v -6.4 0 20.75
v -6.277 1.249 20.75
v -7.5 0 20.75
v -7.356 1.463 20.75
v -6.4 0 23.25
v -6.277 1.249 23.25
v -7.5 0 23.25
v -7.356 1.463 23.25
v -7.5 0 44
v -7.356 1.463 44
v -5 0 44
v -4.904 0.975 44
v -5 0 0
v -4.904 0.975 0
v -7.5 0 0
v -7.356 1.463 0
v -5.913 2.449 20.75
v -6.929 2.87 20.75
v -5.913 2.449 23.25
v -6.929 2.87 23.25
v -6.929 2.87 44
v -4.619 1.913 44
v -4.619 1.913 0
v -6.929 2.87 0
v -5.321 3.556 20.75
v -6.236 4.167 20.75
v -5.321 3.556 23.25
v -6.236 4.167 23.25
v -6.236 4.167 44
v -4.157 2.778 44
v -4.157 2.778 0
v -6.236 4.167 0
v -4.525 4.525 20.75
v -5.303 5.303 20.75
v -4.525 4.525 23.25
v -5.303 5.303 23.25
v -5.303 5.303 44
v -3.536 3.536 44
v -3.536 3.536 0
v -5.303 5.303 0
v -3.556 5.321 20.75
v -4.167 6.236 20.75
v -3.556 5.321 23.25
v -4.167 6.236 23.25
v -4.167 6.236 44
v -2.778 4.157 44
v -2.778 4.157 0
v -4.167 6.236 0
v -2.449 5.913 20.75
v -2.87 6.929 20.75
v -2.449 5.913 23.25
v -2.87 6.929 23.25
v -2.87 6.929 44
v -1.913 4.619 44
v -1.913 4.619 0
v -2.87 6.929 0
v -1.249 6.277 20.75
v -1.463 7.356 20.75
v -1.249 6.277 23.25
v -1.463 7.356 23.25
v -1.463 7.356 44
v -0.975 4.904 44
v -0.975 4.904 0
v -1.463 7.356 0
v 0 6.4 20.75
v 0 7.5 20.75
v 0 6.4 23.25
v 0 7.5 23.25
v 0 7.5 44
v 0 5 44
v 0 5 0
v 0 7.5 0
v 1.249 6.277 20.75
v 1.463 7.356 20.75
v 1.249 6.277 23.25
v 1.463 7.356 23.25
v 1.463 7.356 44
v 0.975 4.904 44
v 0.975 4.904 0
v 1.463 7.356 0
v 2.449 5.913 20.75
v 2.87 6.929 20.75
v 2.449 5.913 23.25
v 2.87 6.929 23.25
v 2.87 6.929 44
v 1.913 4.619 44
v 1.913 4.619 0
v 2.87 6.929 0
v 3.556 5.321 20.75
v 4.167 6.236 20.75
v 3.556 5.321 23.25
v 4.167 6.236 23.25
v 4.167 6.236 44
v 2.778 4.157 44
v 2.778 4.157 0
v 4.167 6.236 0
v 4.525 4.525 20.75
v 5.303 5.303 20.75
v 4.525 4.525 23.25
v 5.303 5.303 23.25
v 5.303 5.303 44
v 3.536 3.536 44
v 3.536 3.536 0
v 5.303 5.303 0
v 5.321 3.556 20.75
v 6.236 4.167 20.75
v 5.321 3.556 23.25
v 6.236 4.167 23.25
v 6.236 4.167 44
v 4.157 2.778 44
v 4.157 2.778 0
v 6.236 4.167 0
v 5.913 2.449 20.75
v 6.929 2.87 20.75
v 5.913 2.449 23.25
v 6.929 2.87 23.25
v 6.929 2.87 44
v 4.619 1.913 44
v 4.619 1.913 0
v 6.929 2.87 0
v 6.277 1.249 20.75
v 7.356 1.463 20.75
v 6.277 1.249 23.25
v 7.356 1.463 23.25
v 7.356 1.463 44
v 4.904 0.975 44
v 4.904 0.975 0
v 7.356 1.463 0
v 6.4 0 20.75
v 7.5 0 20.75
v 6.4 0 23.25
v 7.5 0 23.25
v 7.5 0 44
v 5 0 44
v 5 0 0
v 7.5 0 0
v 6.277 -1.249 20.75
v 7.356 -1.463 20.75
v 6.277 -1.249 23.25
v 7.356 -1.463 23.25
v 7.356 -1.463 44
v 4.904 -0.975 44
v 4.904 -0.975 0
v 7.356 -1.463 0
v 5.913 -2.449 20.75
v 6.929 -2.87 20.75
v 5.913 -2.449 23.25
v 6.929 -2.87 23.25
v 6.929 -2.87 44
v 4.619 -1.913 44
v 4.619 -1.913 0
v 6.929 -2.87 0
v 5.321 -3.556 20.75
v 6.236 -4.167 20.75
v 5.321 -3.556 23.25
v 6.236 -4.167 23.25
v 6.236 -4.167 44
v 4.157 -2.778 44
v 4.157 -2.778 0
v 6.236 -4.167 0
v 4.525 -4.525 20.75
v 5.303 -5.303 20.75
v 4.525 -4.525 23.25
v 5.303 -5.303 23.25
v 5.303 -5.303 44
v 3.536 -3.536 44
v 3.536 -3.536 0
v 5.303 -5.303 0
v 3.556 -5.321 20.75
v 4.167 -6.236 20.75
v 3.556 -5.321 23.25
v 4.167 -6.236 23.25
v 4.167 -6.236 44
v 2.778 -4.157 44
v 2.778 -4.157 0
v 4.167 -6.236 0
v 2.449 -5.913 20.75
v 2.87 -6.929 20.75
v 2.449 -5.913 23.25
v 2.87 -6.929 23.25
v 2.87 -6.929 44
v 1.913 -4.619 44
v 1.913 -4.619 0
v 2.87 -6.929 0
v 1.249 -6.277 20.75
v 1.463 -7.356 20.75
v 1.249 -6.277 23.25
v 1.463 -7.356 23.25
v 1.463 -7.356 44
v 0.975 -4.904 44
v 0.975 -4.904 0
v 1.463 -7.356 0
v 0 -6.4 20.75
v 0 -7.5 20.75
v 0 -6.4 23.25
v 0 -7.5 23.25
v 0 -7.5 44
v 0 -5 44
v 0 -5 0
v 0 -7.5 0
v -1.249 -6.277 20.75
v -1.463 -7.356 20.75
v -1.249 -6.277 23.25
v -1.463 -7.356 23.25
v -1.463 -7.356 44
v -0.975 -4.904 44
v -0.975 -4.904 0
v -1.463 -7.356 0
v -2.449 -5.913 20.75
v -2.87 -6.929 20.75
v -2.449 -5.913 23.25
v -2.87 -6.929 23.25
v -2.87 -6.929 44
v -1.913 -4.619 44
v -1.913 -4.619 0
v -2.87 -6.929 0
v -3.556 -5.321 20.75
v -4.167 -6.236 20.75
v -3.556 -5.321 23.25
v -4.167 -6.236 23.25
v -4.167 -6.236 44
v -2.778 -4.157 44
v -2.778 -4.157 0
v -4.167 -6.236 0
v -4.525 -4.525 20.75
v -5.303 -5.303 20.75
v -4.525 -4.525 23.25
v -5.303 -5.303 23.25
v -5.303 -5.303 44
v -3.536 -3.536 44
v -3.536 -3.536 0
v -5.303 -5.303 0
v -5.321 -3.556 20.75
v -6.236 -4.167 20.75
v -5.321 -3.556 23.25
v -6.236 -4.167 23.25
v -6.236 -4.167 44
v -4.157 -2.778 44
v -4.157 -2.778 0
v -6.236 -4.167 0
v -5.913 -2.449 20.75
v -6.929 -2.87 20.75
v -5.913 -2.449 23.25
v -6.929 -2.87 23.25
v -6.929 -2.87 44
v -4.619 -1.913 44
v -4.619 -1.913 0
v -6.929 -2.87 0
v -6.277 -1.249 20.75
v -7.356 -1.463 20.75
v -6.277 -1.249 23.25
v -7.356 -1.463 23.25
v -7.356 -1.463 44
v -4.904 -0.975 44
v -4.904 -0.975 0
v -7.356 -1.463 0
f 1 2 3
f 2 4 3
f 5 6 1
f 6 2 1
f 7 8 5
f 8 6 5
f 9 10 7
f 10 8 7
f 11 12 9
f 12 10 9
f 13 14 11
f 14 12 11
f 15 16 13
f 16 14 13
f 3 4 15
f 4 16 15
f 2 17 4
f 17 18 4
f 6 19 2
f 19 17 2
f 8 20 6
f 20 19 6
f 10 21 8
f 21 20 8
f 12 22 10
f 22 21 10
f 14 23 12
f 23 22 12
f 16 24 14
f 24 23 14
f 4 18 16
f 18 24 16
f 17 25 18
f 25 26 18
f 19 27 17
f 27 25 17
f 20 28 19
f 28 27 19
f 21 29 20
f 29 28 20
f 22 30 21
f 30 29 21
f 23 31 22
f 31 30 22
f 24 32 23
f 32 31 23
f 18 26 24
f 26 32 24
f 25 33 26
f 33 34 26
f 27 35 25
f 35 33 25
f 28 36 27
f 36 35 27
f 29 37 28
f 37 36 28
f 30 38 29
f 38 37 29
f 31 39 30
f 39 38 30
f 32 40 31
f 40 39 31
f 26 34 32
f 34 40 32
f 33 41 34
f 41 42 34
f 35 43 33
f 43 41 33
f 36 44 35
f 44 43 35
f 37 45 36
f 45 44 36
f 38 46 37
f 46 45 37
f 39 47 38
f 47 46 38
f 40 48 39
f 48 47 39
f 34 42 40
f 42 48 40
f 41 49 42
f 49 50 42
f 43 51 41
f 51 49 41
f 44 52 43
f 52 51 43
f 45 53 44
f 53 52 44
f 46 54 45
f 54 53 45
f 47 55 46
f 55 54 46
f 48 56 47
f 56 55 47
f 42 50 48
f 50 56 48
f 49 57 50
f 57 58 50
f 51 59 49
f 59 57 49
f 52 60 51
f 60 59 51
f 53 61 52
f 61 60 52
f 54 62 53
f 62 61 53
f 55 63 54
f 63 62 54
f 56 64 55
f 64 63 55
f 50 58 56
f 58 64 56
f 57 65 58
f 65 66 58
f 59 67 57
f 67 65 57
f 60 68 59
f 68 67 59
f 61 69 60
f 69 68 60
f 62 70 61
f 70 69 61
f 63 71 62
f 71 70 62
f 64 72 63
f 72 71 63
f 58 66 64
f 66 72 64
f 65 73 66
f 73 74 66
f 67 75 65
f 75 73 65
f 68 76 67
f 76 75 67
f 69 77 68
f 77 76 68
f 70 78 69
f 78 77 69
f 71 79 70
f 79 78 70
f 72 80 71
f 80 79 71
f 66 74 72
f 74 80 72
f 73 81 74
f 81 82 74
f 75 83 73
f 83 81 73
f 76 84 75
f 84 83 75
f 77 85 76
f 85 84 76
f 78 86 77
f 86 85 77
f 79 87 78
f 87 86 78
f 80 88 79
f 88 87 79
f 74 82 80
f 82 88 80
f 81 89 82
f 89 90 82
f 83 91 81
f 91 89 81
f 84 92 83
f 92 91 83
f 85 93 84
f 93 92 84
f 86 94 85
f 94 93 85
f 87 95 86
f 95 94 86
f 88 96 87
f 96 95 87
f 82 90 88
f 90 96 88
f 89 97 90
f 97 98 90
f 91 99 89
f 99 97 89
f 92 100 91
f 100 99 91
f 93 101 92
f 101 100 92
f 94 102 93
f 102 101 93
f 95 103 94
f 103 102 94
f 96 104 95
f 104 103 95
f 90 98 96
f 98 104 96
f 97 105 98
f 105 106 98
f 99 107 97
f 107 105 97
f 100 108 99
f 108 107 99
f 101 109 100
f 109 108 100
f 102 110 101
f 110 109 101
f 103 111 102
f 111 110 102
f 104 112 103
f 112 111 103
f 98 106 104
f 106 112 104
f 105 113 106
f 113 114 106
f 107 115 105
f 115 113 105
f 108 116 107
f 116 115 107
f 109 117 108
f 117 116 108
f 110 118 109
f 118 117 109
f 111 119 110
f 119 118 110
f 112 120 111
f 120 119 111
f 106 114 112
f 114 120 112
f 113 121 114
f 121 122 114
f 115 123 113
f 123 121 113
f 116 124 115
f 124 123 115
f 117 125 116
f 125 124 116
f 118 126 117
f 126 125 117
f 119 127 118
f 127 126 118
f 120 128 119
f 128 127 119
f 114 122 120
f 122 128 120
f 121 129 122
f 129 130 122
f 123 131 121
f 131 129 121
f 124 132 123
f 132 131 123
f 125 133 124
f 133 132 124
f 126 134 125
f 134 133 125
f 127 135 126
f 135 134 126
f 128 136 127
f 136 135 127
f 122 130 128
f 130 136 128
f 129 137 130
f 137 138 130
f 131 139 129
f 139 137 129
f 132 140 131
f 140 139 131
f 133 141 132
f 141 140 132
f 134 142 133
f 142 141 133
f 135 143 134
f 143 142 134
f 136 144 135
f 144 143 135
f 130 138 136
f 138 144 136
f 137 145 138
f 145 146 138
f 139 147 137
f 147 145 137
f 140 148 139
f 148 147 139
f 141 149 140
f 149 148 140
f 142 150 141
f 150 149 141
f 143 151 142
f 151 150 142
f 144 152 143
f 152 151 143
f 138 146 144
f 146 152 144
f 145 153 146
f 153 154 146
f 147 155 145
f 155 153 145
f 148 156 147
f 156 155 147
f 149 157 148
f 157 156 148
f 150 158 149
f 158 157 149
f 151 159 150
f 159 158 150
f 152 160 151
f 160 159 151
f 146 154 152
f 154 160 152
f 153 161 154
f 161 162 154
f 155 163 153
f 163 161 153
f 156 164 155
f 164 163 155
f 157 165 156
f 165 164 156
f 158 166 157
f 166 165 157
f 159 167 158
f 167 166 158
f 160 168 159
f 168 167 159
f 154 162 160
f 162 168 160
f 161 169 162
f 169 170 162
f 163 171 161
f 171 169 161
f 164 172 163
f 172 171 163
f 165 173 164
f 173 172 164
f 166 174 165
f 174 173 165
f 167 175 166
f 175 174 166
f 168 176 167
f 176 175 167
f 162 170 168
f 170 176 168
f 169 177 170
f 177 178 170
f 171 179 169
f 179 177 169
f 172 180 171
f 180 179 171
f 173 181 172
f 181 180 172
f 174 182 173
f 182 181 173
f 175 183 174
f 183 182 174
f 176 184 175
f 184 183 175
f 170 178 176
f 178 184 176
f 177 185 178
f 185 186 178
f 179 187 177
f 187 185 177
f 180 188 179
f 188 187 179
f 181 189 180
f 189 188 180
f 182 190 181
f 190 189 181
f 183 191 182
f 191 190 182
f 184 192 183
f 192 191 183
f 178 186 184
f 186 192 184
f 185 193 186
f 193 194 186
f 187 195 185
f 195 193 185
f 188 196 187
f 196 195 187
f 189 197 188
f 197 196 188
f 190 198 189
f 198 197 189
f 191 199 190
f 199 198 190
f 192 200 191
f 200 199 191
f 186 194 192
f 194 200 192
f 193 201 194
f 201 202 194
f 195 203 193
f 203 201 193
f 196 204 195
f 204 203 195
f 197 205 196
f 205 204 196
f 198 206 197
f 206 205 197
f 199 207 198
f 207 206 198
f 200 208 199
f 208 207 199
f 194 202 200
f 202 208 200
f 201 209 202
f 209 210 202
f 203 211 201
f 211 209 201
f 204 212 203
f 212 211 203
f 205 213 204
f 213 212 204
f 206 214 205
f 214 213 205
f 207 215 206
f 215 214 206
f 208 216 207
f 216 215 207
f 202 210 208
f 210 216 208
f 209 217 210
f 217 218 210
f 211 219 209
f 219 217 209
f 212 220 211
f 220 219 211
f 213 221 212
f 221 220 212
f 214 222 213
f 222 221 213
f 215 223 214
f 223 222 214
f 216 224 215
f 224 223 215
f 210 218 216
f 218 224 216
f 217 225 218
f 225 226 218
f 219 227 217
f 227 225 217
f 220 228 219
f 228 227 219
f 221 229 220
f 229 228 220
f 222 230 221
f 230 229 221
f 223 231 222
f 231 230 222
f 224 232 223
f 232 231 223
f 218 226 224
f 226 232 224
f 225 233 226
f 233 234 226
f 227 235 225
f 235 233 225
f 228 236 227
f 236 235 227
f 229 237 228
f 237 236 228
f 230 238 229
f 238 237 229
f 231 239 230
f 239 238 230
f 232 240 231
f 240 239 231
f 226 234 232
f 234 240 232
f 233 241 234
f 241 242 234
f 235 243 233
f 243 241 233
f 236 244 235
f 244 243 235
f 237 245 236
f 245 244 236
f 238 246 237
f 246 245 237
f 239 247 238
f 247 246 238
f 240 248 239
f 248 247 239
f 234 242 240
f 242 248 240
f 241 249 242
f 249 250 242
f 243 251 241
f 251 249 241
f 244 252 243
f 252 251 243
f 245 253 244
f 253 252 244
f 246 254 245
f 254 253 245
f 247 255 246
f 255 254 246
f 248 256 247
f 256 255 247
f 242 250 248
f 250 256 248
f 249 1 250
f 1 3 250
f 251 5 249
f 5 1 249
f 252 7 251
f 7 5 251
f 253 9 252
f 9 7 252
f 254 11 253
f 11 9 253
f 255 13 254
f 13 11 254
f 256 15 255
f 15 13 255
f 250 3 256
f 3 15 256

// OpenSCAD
$fn = 32;

// ----------------------------------------------------------------------
// Grooved revolve: stepped, bore R5
// ----------------------------------------------------------------------

// --- parameters (mm) ---
bore_r = 5;               // bore radius
outer_r = 7.5;            // outer radius of the body
total_h = 44;             // overall height, Z
wall = 2.5;               // radial wall thickness
groove_w = 2.5;           // groove width
groove_d = 1.1;           // groove depth
grooves = 1;              // number of outer grooves

bbox_x = 2 * outer_r;  // full diameter
bore_d = 2 * bore_r;  // bore diameter
body_d = 2 * outer_r;  // body diameter
revolve_angle = 360;  // full turn around the Z axis

profile = [[5, 0], [7.5, 0], [7.5, 20.75], [6.4, 20.75], [6.4, 23.25], [7.5, 23.25], [7.5, 44], [5, 44]];  // primary outline, 8 points, counter clockwise

// --- the one profile operation ---
rotate_extrude(angle = revolve_angle) polygon(points = profile);
